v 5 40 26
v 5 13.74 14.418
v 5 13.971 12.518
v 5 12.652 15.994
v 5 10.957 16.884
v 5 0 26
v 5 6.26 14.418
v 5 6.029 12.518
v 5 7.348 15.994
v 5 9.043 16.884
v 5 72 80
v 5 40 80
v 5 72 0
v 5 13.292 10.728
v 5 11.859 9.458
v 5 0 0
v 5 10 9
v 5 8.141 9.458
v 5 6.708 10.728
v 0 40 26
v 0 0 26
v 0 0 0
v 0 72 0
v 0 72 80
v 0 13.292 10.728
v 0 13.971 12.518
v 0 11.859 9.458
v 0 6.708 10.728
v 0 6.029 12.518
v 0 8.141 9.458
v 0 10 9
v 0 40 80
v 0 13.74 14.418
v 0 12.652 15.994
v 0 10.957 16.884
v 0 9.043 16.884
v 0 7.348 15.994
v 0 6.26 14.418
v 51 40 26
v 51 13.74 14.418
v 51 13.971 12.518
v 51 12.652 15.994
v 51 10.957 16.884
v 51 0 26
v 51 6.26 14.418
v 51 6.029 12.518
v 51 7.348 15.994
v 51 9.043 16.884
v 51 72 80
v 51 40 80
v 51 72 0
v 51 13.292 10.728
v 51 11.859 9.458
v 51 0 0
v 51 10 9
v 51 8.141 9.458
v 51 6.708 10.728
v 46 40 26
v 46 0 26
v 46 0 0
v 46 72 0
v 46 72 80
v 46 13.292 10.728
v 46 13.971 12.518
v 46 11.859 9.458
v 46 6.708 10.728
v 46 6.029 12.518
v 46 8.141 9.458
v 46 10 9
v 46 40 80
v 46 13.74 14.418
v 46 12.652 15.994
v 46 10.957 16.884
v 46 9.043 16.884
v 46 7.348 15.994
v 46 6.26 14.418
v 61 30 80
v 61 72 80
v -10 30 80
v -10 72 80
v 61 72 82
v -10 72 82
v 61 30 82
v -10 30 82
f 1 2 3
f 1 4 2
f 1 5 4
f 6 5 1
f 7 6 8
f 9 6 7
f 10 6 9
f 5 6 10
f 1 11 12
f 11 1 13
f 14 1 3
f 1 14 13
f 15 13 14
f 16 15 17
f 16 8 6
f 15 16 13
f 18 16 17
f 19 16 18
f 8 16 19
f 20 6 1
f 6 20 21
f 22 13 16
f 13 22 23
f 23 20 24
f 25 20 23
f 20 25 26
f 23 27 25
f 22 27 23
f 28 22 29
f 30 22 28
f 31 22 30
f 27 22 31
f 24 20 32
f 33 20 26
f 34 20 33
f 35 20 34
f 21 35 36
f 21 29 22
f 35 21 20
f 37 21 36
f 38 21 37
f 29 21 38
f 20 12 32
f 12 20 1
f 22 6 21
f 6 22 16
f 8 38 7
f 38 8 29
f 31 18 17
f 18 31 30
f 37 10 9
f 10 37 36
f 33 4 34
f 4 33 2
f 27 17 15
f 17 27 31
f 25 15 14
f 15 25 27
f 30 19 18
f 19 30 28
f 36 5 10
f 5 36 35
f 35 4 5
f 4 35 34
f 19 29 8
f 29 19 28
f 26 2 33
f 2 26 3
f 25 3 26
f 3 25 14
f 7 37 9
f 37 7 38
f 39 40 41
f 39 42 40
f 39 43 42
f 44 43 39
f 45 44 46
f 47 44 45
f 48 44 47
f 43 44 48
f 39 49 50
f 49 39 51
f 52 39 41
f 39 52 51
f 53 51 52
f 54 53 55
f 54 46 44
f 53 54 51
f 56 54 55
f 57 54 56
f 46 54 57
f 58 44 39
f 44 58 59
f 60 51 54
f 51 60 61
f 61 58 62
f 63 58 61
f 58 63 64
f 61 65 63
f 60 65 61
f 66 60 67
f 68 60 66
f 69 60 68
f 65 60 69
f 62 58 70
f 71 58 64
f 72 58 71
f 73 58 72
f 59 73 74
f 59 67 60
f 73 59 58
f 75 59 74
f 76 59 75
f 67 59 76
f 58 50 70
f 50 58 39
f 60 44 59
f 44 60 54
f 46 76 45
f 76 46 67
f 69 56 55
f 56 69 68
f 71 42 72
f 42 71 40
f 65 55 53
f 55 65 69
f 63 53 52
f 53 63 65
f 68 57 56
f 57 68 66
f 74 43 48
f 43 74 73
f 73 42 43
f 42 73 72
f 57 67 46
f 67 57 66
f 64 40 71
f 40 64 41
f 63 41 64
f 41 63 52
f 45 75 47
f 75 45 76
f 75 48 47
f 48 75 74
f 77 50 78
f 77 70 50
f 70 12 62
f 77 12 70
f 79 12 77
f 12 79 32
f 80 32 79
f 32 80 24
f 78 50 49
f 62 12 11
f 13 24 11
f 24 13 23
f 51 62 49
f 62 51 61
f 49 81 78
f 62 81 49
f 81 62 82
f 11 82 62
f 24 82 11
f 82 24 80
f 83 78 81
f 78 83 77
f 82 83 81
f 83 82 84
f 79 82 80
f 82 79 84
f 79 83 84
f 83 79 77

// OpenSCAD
// Note: Everything is in millimeters

tube_inner_height = 26;
tube_inner_width = 46;
tab_len = 40;
rise_height = 80;
bar_stock_thickness = 5;
bar_stock_width = 32;
top_plate_overhang_x = 10;
top_plate_overhang_y = 10;
top_plate_width = tube_inner_width + top_plate_overhang_x*2 + bar_stock_thickness;
top_plate_thickness = 2;
top_plate_length = bar_stock_width + top_plate_overhang_y;
tab_hole_size = 8;

difference(){
    cube([bar_stock_thickness,tab_len,tube_inner_height]);
    tab_hole();
}

translate([0,tab_len,0])
    cube([bar_stock_thickness,bar_stock_width,rise_height]);

translate([tube_inner_width,0,0])
    difference(){
        cube([bar_stock_thickness,tab_len,tube_inner_height]);
        tab_hole();
    }

translate([tube_inner_width,tab_len,0])
    cube([bar_stock_thickness,bar_stock_width,rise_height]);
    
translate([tube_inner_width/2-top_plate_width/2+bar_stock_thickness/2,tab_len+bar_stock_width-top_plate_length,rise_height])
    cube([top_plate_width,top_plate_length,top_plate_thickness]);

module tab_hole(){
    translate([-1,10,tube_inner_height/2])    
        rotate([0,90,0])
        cylinder(h=bar_stock_thickness+2,d=tab_hole_size);
}
